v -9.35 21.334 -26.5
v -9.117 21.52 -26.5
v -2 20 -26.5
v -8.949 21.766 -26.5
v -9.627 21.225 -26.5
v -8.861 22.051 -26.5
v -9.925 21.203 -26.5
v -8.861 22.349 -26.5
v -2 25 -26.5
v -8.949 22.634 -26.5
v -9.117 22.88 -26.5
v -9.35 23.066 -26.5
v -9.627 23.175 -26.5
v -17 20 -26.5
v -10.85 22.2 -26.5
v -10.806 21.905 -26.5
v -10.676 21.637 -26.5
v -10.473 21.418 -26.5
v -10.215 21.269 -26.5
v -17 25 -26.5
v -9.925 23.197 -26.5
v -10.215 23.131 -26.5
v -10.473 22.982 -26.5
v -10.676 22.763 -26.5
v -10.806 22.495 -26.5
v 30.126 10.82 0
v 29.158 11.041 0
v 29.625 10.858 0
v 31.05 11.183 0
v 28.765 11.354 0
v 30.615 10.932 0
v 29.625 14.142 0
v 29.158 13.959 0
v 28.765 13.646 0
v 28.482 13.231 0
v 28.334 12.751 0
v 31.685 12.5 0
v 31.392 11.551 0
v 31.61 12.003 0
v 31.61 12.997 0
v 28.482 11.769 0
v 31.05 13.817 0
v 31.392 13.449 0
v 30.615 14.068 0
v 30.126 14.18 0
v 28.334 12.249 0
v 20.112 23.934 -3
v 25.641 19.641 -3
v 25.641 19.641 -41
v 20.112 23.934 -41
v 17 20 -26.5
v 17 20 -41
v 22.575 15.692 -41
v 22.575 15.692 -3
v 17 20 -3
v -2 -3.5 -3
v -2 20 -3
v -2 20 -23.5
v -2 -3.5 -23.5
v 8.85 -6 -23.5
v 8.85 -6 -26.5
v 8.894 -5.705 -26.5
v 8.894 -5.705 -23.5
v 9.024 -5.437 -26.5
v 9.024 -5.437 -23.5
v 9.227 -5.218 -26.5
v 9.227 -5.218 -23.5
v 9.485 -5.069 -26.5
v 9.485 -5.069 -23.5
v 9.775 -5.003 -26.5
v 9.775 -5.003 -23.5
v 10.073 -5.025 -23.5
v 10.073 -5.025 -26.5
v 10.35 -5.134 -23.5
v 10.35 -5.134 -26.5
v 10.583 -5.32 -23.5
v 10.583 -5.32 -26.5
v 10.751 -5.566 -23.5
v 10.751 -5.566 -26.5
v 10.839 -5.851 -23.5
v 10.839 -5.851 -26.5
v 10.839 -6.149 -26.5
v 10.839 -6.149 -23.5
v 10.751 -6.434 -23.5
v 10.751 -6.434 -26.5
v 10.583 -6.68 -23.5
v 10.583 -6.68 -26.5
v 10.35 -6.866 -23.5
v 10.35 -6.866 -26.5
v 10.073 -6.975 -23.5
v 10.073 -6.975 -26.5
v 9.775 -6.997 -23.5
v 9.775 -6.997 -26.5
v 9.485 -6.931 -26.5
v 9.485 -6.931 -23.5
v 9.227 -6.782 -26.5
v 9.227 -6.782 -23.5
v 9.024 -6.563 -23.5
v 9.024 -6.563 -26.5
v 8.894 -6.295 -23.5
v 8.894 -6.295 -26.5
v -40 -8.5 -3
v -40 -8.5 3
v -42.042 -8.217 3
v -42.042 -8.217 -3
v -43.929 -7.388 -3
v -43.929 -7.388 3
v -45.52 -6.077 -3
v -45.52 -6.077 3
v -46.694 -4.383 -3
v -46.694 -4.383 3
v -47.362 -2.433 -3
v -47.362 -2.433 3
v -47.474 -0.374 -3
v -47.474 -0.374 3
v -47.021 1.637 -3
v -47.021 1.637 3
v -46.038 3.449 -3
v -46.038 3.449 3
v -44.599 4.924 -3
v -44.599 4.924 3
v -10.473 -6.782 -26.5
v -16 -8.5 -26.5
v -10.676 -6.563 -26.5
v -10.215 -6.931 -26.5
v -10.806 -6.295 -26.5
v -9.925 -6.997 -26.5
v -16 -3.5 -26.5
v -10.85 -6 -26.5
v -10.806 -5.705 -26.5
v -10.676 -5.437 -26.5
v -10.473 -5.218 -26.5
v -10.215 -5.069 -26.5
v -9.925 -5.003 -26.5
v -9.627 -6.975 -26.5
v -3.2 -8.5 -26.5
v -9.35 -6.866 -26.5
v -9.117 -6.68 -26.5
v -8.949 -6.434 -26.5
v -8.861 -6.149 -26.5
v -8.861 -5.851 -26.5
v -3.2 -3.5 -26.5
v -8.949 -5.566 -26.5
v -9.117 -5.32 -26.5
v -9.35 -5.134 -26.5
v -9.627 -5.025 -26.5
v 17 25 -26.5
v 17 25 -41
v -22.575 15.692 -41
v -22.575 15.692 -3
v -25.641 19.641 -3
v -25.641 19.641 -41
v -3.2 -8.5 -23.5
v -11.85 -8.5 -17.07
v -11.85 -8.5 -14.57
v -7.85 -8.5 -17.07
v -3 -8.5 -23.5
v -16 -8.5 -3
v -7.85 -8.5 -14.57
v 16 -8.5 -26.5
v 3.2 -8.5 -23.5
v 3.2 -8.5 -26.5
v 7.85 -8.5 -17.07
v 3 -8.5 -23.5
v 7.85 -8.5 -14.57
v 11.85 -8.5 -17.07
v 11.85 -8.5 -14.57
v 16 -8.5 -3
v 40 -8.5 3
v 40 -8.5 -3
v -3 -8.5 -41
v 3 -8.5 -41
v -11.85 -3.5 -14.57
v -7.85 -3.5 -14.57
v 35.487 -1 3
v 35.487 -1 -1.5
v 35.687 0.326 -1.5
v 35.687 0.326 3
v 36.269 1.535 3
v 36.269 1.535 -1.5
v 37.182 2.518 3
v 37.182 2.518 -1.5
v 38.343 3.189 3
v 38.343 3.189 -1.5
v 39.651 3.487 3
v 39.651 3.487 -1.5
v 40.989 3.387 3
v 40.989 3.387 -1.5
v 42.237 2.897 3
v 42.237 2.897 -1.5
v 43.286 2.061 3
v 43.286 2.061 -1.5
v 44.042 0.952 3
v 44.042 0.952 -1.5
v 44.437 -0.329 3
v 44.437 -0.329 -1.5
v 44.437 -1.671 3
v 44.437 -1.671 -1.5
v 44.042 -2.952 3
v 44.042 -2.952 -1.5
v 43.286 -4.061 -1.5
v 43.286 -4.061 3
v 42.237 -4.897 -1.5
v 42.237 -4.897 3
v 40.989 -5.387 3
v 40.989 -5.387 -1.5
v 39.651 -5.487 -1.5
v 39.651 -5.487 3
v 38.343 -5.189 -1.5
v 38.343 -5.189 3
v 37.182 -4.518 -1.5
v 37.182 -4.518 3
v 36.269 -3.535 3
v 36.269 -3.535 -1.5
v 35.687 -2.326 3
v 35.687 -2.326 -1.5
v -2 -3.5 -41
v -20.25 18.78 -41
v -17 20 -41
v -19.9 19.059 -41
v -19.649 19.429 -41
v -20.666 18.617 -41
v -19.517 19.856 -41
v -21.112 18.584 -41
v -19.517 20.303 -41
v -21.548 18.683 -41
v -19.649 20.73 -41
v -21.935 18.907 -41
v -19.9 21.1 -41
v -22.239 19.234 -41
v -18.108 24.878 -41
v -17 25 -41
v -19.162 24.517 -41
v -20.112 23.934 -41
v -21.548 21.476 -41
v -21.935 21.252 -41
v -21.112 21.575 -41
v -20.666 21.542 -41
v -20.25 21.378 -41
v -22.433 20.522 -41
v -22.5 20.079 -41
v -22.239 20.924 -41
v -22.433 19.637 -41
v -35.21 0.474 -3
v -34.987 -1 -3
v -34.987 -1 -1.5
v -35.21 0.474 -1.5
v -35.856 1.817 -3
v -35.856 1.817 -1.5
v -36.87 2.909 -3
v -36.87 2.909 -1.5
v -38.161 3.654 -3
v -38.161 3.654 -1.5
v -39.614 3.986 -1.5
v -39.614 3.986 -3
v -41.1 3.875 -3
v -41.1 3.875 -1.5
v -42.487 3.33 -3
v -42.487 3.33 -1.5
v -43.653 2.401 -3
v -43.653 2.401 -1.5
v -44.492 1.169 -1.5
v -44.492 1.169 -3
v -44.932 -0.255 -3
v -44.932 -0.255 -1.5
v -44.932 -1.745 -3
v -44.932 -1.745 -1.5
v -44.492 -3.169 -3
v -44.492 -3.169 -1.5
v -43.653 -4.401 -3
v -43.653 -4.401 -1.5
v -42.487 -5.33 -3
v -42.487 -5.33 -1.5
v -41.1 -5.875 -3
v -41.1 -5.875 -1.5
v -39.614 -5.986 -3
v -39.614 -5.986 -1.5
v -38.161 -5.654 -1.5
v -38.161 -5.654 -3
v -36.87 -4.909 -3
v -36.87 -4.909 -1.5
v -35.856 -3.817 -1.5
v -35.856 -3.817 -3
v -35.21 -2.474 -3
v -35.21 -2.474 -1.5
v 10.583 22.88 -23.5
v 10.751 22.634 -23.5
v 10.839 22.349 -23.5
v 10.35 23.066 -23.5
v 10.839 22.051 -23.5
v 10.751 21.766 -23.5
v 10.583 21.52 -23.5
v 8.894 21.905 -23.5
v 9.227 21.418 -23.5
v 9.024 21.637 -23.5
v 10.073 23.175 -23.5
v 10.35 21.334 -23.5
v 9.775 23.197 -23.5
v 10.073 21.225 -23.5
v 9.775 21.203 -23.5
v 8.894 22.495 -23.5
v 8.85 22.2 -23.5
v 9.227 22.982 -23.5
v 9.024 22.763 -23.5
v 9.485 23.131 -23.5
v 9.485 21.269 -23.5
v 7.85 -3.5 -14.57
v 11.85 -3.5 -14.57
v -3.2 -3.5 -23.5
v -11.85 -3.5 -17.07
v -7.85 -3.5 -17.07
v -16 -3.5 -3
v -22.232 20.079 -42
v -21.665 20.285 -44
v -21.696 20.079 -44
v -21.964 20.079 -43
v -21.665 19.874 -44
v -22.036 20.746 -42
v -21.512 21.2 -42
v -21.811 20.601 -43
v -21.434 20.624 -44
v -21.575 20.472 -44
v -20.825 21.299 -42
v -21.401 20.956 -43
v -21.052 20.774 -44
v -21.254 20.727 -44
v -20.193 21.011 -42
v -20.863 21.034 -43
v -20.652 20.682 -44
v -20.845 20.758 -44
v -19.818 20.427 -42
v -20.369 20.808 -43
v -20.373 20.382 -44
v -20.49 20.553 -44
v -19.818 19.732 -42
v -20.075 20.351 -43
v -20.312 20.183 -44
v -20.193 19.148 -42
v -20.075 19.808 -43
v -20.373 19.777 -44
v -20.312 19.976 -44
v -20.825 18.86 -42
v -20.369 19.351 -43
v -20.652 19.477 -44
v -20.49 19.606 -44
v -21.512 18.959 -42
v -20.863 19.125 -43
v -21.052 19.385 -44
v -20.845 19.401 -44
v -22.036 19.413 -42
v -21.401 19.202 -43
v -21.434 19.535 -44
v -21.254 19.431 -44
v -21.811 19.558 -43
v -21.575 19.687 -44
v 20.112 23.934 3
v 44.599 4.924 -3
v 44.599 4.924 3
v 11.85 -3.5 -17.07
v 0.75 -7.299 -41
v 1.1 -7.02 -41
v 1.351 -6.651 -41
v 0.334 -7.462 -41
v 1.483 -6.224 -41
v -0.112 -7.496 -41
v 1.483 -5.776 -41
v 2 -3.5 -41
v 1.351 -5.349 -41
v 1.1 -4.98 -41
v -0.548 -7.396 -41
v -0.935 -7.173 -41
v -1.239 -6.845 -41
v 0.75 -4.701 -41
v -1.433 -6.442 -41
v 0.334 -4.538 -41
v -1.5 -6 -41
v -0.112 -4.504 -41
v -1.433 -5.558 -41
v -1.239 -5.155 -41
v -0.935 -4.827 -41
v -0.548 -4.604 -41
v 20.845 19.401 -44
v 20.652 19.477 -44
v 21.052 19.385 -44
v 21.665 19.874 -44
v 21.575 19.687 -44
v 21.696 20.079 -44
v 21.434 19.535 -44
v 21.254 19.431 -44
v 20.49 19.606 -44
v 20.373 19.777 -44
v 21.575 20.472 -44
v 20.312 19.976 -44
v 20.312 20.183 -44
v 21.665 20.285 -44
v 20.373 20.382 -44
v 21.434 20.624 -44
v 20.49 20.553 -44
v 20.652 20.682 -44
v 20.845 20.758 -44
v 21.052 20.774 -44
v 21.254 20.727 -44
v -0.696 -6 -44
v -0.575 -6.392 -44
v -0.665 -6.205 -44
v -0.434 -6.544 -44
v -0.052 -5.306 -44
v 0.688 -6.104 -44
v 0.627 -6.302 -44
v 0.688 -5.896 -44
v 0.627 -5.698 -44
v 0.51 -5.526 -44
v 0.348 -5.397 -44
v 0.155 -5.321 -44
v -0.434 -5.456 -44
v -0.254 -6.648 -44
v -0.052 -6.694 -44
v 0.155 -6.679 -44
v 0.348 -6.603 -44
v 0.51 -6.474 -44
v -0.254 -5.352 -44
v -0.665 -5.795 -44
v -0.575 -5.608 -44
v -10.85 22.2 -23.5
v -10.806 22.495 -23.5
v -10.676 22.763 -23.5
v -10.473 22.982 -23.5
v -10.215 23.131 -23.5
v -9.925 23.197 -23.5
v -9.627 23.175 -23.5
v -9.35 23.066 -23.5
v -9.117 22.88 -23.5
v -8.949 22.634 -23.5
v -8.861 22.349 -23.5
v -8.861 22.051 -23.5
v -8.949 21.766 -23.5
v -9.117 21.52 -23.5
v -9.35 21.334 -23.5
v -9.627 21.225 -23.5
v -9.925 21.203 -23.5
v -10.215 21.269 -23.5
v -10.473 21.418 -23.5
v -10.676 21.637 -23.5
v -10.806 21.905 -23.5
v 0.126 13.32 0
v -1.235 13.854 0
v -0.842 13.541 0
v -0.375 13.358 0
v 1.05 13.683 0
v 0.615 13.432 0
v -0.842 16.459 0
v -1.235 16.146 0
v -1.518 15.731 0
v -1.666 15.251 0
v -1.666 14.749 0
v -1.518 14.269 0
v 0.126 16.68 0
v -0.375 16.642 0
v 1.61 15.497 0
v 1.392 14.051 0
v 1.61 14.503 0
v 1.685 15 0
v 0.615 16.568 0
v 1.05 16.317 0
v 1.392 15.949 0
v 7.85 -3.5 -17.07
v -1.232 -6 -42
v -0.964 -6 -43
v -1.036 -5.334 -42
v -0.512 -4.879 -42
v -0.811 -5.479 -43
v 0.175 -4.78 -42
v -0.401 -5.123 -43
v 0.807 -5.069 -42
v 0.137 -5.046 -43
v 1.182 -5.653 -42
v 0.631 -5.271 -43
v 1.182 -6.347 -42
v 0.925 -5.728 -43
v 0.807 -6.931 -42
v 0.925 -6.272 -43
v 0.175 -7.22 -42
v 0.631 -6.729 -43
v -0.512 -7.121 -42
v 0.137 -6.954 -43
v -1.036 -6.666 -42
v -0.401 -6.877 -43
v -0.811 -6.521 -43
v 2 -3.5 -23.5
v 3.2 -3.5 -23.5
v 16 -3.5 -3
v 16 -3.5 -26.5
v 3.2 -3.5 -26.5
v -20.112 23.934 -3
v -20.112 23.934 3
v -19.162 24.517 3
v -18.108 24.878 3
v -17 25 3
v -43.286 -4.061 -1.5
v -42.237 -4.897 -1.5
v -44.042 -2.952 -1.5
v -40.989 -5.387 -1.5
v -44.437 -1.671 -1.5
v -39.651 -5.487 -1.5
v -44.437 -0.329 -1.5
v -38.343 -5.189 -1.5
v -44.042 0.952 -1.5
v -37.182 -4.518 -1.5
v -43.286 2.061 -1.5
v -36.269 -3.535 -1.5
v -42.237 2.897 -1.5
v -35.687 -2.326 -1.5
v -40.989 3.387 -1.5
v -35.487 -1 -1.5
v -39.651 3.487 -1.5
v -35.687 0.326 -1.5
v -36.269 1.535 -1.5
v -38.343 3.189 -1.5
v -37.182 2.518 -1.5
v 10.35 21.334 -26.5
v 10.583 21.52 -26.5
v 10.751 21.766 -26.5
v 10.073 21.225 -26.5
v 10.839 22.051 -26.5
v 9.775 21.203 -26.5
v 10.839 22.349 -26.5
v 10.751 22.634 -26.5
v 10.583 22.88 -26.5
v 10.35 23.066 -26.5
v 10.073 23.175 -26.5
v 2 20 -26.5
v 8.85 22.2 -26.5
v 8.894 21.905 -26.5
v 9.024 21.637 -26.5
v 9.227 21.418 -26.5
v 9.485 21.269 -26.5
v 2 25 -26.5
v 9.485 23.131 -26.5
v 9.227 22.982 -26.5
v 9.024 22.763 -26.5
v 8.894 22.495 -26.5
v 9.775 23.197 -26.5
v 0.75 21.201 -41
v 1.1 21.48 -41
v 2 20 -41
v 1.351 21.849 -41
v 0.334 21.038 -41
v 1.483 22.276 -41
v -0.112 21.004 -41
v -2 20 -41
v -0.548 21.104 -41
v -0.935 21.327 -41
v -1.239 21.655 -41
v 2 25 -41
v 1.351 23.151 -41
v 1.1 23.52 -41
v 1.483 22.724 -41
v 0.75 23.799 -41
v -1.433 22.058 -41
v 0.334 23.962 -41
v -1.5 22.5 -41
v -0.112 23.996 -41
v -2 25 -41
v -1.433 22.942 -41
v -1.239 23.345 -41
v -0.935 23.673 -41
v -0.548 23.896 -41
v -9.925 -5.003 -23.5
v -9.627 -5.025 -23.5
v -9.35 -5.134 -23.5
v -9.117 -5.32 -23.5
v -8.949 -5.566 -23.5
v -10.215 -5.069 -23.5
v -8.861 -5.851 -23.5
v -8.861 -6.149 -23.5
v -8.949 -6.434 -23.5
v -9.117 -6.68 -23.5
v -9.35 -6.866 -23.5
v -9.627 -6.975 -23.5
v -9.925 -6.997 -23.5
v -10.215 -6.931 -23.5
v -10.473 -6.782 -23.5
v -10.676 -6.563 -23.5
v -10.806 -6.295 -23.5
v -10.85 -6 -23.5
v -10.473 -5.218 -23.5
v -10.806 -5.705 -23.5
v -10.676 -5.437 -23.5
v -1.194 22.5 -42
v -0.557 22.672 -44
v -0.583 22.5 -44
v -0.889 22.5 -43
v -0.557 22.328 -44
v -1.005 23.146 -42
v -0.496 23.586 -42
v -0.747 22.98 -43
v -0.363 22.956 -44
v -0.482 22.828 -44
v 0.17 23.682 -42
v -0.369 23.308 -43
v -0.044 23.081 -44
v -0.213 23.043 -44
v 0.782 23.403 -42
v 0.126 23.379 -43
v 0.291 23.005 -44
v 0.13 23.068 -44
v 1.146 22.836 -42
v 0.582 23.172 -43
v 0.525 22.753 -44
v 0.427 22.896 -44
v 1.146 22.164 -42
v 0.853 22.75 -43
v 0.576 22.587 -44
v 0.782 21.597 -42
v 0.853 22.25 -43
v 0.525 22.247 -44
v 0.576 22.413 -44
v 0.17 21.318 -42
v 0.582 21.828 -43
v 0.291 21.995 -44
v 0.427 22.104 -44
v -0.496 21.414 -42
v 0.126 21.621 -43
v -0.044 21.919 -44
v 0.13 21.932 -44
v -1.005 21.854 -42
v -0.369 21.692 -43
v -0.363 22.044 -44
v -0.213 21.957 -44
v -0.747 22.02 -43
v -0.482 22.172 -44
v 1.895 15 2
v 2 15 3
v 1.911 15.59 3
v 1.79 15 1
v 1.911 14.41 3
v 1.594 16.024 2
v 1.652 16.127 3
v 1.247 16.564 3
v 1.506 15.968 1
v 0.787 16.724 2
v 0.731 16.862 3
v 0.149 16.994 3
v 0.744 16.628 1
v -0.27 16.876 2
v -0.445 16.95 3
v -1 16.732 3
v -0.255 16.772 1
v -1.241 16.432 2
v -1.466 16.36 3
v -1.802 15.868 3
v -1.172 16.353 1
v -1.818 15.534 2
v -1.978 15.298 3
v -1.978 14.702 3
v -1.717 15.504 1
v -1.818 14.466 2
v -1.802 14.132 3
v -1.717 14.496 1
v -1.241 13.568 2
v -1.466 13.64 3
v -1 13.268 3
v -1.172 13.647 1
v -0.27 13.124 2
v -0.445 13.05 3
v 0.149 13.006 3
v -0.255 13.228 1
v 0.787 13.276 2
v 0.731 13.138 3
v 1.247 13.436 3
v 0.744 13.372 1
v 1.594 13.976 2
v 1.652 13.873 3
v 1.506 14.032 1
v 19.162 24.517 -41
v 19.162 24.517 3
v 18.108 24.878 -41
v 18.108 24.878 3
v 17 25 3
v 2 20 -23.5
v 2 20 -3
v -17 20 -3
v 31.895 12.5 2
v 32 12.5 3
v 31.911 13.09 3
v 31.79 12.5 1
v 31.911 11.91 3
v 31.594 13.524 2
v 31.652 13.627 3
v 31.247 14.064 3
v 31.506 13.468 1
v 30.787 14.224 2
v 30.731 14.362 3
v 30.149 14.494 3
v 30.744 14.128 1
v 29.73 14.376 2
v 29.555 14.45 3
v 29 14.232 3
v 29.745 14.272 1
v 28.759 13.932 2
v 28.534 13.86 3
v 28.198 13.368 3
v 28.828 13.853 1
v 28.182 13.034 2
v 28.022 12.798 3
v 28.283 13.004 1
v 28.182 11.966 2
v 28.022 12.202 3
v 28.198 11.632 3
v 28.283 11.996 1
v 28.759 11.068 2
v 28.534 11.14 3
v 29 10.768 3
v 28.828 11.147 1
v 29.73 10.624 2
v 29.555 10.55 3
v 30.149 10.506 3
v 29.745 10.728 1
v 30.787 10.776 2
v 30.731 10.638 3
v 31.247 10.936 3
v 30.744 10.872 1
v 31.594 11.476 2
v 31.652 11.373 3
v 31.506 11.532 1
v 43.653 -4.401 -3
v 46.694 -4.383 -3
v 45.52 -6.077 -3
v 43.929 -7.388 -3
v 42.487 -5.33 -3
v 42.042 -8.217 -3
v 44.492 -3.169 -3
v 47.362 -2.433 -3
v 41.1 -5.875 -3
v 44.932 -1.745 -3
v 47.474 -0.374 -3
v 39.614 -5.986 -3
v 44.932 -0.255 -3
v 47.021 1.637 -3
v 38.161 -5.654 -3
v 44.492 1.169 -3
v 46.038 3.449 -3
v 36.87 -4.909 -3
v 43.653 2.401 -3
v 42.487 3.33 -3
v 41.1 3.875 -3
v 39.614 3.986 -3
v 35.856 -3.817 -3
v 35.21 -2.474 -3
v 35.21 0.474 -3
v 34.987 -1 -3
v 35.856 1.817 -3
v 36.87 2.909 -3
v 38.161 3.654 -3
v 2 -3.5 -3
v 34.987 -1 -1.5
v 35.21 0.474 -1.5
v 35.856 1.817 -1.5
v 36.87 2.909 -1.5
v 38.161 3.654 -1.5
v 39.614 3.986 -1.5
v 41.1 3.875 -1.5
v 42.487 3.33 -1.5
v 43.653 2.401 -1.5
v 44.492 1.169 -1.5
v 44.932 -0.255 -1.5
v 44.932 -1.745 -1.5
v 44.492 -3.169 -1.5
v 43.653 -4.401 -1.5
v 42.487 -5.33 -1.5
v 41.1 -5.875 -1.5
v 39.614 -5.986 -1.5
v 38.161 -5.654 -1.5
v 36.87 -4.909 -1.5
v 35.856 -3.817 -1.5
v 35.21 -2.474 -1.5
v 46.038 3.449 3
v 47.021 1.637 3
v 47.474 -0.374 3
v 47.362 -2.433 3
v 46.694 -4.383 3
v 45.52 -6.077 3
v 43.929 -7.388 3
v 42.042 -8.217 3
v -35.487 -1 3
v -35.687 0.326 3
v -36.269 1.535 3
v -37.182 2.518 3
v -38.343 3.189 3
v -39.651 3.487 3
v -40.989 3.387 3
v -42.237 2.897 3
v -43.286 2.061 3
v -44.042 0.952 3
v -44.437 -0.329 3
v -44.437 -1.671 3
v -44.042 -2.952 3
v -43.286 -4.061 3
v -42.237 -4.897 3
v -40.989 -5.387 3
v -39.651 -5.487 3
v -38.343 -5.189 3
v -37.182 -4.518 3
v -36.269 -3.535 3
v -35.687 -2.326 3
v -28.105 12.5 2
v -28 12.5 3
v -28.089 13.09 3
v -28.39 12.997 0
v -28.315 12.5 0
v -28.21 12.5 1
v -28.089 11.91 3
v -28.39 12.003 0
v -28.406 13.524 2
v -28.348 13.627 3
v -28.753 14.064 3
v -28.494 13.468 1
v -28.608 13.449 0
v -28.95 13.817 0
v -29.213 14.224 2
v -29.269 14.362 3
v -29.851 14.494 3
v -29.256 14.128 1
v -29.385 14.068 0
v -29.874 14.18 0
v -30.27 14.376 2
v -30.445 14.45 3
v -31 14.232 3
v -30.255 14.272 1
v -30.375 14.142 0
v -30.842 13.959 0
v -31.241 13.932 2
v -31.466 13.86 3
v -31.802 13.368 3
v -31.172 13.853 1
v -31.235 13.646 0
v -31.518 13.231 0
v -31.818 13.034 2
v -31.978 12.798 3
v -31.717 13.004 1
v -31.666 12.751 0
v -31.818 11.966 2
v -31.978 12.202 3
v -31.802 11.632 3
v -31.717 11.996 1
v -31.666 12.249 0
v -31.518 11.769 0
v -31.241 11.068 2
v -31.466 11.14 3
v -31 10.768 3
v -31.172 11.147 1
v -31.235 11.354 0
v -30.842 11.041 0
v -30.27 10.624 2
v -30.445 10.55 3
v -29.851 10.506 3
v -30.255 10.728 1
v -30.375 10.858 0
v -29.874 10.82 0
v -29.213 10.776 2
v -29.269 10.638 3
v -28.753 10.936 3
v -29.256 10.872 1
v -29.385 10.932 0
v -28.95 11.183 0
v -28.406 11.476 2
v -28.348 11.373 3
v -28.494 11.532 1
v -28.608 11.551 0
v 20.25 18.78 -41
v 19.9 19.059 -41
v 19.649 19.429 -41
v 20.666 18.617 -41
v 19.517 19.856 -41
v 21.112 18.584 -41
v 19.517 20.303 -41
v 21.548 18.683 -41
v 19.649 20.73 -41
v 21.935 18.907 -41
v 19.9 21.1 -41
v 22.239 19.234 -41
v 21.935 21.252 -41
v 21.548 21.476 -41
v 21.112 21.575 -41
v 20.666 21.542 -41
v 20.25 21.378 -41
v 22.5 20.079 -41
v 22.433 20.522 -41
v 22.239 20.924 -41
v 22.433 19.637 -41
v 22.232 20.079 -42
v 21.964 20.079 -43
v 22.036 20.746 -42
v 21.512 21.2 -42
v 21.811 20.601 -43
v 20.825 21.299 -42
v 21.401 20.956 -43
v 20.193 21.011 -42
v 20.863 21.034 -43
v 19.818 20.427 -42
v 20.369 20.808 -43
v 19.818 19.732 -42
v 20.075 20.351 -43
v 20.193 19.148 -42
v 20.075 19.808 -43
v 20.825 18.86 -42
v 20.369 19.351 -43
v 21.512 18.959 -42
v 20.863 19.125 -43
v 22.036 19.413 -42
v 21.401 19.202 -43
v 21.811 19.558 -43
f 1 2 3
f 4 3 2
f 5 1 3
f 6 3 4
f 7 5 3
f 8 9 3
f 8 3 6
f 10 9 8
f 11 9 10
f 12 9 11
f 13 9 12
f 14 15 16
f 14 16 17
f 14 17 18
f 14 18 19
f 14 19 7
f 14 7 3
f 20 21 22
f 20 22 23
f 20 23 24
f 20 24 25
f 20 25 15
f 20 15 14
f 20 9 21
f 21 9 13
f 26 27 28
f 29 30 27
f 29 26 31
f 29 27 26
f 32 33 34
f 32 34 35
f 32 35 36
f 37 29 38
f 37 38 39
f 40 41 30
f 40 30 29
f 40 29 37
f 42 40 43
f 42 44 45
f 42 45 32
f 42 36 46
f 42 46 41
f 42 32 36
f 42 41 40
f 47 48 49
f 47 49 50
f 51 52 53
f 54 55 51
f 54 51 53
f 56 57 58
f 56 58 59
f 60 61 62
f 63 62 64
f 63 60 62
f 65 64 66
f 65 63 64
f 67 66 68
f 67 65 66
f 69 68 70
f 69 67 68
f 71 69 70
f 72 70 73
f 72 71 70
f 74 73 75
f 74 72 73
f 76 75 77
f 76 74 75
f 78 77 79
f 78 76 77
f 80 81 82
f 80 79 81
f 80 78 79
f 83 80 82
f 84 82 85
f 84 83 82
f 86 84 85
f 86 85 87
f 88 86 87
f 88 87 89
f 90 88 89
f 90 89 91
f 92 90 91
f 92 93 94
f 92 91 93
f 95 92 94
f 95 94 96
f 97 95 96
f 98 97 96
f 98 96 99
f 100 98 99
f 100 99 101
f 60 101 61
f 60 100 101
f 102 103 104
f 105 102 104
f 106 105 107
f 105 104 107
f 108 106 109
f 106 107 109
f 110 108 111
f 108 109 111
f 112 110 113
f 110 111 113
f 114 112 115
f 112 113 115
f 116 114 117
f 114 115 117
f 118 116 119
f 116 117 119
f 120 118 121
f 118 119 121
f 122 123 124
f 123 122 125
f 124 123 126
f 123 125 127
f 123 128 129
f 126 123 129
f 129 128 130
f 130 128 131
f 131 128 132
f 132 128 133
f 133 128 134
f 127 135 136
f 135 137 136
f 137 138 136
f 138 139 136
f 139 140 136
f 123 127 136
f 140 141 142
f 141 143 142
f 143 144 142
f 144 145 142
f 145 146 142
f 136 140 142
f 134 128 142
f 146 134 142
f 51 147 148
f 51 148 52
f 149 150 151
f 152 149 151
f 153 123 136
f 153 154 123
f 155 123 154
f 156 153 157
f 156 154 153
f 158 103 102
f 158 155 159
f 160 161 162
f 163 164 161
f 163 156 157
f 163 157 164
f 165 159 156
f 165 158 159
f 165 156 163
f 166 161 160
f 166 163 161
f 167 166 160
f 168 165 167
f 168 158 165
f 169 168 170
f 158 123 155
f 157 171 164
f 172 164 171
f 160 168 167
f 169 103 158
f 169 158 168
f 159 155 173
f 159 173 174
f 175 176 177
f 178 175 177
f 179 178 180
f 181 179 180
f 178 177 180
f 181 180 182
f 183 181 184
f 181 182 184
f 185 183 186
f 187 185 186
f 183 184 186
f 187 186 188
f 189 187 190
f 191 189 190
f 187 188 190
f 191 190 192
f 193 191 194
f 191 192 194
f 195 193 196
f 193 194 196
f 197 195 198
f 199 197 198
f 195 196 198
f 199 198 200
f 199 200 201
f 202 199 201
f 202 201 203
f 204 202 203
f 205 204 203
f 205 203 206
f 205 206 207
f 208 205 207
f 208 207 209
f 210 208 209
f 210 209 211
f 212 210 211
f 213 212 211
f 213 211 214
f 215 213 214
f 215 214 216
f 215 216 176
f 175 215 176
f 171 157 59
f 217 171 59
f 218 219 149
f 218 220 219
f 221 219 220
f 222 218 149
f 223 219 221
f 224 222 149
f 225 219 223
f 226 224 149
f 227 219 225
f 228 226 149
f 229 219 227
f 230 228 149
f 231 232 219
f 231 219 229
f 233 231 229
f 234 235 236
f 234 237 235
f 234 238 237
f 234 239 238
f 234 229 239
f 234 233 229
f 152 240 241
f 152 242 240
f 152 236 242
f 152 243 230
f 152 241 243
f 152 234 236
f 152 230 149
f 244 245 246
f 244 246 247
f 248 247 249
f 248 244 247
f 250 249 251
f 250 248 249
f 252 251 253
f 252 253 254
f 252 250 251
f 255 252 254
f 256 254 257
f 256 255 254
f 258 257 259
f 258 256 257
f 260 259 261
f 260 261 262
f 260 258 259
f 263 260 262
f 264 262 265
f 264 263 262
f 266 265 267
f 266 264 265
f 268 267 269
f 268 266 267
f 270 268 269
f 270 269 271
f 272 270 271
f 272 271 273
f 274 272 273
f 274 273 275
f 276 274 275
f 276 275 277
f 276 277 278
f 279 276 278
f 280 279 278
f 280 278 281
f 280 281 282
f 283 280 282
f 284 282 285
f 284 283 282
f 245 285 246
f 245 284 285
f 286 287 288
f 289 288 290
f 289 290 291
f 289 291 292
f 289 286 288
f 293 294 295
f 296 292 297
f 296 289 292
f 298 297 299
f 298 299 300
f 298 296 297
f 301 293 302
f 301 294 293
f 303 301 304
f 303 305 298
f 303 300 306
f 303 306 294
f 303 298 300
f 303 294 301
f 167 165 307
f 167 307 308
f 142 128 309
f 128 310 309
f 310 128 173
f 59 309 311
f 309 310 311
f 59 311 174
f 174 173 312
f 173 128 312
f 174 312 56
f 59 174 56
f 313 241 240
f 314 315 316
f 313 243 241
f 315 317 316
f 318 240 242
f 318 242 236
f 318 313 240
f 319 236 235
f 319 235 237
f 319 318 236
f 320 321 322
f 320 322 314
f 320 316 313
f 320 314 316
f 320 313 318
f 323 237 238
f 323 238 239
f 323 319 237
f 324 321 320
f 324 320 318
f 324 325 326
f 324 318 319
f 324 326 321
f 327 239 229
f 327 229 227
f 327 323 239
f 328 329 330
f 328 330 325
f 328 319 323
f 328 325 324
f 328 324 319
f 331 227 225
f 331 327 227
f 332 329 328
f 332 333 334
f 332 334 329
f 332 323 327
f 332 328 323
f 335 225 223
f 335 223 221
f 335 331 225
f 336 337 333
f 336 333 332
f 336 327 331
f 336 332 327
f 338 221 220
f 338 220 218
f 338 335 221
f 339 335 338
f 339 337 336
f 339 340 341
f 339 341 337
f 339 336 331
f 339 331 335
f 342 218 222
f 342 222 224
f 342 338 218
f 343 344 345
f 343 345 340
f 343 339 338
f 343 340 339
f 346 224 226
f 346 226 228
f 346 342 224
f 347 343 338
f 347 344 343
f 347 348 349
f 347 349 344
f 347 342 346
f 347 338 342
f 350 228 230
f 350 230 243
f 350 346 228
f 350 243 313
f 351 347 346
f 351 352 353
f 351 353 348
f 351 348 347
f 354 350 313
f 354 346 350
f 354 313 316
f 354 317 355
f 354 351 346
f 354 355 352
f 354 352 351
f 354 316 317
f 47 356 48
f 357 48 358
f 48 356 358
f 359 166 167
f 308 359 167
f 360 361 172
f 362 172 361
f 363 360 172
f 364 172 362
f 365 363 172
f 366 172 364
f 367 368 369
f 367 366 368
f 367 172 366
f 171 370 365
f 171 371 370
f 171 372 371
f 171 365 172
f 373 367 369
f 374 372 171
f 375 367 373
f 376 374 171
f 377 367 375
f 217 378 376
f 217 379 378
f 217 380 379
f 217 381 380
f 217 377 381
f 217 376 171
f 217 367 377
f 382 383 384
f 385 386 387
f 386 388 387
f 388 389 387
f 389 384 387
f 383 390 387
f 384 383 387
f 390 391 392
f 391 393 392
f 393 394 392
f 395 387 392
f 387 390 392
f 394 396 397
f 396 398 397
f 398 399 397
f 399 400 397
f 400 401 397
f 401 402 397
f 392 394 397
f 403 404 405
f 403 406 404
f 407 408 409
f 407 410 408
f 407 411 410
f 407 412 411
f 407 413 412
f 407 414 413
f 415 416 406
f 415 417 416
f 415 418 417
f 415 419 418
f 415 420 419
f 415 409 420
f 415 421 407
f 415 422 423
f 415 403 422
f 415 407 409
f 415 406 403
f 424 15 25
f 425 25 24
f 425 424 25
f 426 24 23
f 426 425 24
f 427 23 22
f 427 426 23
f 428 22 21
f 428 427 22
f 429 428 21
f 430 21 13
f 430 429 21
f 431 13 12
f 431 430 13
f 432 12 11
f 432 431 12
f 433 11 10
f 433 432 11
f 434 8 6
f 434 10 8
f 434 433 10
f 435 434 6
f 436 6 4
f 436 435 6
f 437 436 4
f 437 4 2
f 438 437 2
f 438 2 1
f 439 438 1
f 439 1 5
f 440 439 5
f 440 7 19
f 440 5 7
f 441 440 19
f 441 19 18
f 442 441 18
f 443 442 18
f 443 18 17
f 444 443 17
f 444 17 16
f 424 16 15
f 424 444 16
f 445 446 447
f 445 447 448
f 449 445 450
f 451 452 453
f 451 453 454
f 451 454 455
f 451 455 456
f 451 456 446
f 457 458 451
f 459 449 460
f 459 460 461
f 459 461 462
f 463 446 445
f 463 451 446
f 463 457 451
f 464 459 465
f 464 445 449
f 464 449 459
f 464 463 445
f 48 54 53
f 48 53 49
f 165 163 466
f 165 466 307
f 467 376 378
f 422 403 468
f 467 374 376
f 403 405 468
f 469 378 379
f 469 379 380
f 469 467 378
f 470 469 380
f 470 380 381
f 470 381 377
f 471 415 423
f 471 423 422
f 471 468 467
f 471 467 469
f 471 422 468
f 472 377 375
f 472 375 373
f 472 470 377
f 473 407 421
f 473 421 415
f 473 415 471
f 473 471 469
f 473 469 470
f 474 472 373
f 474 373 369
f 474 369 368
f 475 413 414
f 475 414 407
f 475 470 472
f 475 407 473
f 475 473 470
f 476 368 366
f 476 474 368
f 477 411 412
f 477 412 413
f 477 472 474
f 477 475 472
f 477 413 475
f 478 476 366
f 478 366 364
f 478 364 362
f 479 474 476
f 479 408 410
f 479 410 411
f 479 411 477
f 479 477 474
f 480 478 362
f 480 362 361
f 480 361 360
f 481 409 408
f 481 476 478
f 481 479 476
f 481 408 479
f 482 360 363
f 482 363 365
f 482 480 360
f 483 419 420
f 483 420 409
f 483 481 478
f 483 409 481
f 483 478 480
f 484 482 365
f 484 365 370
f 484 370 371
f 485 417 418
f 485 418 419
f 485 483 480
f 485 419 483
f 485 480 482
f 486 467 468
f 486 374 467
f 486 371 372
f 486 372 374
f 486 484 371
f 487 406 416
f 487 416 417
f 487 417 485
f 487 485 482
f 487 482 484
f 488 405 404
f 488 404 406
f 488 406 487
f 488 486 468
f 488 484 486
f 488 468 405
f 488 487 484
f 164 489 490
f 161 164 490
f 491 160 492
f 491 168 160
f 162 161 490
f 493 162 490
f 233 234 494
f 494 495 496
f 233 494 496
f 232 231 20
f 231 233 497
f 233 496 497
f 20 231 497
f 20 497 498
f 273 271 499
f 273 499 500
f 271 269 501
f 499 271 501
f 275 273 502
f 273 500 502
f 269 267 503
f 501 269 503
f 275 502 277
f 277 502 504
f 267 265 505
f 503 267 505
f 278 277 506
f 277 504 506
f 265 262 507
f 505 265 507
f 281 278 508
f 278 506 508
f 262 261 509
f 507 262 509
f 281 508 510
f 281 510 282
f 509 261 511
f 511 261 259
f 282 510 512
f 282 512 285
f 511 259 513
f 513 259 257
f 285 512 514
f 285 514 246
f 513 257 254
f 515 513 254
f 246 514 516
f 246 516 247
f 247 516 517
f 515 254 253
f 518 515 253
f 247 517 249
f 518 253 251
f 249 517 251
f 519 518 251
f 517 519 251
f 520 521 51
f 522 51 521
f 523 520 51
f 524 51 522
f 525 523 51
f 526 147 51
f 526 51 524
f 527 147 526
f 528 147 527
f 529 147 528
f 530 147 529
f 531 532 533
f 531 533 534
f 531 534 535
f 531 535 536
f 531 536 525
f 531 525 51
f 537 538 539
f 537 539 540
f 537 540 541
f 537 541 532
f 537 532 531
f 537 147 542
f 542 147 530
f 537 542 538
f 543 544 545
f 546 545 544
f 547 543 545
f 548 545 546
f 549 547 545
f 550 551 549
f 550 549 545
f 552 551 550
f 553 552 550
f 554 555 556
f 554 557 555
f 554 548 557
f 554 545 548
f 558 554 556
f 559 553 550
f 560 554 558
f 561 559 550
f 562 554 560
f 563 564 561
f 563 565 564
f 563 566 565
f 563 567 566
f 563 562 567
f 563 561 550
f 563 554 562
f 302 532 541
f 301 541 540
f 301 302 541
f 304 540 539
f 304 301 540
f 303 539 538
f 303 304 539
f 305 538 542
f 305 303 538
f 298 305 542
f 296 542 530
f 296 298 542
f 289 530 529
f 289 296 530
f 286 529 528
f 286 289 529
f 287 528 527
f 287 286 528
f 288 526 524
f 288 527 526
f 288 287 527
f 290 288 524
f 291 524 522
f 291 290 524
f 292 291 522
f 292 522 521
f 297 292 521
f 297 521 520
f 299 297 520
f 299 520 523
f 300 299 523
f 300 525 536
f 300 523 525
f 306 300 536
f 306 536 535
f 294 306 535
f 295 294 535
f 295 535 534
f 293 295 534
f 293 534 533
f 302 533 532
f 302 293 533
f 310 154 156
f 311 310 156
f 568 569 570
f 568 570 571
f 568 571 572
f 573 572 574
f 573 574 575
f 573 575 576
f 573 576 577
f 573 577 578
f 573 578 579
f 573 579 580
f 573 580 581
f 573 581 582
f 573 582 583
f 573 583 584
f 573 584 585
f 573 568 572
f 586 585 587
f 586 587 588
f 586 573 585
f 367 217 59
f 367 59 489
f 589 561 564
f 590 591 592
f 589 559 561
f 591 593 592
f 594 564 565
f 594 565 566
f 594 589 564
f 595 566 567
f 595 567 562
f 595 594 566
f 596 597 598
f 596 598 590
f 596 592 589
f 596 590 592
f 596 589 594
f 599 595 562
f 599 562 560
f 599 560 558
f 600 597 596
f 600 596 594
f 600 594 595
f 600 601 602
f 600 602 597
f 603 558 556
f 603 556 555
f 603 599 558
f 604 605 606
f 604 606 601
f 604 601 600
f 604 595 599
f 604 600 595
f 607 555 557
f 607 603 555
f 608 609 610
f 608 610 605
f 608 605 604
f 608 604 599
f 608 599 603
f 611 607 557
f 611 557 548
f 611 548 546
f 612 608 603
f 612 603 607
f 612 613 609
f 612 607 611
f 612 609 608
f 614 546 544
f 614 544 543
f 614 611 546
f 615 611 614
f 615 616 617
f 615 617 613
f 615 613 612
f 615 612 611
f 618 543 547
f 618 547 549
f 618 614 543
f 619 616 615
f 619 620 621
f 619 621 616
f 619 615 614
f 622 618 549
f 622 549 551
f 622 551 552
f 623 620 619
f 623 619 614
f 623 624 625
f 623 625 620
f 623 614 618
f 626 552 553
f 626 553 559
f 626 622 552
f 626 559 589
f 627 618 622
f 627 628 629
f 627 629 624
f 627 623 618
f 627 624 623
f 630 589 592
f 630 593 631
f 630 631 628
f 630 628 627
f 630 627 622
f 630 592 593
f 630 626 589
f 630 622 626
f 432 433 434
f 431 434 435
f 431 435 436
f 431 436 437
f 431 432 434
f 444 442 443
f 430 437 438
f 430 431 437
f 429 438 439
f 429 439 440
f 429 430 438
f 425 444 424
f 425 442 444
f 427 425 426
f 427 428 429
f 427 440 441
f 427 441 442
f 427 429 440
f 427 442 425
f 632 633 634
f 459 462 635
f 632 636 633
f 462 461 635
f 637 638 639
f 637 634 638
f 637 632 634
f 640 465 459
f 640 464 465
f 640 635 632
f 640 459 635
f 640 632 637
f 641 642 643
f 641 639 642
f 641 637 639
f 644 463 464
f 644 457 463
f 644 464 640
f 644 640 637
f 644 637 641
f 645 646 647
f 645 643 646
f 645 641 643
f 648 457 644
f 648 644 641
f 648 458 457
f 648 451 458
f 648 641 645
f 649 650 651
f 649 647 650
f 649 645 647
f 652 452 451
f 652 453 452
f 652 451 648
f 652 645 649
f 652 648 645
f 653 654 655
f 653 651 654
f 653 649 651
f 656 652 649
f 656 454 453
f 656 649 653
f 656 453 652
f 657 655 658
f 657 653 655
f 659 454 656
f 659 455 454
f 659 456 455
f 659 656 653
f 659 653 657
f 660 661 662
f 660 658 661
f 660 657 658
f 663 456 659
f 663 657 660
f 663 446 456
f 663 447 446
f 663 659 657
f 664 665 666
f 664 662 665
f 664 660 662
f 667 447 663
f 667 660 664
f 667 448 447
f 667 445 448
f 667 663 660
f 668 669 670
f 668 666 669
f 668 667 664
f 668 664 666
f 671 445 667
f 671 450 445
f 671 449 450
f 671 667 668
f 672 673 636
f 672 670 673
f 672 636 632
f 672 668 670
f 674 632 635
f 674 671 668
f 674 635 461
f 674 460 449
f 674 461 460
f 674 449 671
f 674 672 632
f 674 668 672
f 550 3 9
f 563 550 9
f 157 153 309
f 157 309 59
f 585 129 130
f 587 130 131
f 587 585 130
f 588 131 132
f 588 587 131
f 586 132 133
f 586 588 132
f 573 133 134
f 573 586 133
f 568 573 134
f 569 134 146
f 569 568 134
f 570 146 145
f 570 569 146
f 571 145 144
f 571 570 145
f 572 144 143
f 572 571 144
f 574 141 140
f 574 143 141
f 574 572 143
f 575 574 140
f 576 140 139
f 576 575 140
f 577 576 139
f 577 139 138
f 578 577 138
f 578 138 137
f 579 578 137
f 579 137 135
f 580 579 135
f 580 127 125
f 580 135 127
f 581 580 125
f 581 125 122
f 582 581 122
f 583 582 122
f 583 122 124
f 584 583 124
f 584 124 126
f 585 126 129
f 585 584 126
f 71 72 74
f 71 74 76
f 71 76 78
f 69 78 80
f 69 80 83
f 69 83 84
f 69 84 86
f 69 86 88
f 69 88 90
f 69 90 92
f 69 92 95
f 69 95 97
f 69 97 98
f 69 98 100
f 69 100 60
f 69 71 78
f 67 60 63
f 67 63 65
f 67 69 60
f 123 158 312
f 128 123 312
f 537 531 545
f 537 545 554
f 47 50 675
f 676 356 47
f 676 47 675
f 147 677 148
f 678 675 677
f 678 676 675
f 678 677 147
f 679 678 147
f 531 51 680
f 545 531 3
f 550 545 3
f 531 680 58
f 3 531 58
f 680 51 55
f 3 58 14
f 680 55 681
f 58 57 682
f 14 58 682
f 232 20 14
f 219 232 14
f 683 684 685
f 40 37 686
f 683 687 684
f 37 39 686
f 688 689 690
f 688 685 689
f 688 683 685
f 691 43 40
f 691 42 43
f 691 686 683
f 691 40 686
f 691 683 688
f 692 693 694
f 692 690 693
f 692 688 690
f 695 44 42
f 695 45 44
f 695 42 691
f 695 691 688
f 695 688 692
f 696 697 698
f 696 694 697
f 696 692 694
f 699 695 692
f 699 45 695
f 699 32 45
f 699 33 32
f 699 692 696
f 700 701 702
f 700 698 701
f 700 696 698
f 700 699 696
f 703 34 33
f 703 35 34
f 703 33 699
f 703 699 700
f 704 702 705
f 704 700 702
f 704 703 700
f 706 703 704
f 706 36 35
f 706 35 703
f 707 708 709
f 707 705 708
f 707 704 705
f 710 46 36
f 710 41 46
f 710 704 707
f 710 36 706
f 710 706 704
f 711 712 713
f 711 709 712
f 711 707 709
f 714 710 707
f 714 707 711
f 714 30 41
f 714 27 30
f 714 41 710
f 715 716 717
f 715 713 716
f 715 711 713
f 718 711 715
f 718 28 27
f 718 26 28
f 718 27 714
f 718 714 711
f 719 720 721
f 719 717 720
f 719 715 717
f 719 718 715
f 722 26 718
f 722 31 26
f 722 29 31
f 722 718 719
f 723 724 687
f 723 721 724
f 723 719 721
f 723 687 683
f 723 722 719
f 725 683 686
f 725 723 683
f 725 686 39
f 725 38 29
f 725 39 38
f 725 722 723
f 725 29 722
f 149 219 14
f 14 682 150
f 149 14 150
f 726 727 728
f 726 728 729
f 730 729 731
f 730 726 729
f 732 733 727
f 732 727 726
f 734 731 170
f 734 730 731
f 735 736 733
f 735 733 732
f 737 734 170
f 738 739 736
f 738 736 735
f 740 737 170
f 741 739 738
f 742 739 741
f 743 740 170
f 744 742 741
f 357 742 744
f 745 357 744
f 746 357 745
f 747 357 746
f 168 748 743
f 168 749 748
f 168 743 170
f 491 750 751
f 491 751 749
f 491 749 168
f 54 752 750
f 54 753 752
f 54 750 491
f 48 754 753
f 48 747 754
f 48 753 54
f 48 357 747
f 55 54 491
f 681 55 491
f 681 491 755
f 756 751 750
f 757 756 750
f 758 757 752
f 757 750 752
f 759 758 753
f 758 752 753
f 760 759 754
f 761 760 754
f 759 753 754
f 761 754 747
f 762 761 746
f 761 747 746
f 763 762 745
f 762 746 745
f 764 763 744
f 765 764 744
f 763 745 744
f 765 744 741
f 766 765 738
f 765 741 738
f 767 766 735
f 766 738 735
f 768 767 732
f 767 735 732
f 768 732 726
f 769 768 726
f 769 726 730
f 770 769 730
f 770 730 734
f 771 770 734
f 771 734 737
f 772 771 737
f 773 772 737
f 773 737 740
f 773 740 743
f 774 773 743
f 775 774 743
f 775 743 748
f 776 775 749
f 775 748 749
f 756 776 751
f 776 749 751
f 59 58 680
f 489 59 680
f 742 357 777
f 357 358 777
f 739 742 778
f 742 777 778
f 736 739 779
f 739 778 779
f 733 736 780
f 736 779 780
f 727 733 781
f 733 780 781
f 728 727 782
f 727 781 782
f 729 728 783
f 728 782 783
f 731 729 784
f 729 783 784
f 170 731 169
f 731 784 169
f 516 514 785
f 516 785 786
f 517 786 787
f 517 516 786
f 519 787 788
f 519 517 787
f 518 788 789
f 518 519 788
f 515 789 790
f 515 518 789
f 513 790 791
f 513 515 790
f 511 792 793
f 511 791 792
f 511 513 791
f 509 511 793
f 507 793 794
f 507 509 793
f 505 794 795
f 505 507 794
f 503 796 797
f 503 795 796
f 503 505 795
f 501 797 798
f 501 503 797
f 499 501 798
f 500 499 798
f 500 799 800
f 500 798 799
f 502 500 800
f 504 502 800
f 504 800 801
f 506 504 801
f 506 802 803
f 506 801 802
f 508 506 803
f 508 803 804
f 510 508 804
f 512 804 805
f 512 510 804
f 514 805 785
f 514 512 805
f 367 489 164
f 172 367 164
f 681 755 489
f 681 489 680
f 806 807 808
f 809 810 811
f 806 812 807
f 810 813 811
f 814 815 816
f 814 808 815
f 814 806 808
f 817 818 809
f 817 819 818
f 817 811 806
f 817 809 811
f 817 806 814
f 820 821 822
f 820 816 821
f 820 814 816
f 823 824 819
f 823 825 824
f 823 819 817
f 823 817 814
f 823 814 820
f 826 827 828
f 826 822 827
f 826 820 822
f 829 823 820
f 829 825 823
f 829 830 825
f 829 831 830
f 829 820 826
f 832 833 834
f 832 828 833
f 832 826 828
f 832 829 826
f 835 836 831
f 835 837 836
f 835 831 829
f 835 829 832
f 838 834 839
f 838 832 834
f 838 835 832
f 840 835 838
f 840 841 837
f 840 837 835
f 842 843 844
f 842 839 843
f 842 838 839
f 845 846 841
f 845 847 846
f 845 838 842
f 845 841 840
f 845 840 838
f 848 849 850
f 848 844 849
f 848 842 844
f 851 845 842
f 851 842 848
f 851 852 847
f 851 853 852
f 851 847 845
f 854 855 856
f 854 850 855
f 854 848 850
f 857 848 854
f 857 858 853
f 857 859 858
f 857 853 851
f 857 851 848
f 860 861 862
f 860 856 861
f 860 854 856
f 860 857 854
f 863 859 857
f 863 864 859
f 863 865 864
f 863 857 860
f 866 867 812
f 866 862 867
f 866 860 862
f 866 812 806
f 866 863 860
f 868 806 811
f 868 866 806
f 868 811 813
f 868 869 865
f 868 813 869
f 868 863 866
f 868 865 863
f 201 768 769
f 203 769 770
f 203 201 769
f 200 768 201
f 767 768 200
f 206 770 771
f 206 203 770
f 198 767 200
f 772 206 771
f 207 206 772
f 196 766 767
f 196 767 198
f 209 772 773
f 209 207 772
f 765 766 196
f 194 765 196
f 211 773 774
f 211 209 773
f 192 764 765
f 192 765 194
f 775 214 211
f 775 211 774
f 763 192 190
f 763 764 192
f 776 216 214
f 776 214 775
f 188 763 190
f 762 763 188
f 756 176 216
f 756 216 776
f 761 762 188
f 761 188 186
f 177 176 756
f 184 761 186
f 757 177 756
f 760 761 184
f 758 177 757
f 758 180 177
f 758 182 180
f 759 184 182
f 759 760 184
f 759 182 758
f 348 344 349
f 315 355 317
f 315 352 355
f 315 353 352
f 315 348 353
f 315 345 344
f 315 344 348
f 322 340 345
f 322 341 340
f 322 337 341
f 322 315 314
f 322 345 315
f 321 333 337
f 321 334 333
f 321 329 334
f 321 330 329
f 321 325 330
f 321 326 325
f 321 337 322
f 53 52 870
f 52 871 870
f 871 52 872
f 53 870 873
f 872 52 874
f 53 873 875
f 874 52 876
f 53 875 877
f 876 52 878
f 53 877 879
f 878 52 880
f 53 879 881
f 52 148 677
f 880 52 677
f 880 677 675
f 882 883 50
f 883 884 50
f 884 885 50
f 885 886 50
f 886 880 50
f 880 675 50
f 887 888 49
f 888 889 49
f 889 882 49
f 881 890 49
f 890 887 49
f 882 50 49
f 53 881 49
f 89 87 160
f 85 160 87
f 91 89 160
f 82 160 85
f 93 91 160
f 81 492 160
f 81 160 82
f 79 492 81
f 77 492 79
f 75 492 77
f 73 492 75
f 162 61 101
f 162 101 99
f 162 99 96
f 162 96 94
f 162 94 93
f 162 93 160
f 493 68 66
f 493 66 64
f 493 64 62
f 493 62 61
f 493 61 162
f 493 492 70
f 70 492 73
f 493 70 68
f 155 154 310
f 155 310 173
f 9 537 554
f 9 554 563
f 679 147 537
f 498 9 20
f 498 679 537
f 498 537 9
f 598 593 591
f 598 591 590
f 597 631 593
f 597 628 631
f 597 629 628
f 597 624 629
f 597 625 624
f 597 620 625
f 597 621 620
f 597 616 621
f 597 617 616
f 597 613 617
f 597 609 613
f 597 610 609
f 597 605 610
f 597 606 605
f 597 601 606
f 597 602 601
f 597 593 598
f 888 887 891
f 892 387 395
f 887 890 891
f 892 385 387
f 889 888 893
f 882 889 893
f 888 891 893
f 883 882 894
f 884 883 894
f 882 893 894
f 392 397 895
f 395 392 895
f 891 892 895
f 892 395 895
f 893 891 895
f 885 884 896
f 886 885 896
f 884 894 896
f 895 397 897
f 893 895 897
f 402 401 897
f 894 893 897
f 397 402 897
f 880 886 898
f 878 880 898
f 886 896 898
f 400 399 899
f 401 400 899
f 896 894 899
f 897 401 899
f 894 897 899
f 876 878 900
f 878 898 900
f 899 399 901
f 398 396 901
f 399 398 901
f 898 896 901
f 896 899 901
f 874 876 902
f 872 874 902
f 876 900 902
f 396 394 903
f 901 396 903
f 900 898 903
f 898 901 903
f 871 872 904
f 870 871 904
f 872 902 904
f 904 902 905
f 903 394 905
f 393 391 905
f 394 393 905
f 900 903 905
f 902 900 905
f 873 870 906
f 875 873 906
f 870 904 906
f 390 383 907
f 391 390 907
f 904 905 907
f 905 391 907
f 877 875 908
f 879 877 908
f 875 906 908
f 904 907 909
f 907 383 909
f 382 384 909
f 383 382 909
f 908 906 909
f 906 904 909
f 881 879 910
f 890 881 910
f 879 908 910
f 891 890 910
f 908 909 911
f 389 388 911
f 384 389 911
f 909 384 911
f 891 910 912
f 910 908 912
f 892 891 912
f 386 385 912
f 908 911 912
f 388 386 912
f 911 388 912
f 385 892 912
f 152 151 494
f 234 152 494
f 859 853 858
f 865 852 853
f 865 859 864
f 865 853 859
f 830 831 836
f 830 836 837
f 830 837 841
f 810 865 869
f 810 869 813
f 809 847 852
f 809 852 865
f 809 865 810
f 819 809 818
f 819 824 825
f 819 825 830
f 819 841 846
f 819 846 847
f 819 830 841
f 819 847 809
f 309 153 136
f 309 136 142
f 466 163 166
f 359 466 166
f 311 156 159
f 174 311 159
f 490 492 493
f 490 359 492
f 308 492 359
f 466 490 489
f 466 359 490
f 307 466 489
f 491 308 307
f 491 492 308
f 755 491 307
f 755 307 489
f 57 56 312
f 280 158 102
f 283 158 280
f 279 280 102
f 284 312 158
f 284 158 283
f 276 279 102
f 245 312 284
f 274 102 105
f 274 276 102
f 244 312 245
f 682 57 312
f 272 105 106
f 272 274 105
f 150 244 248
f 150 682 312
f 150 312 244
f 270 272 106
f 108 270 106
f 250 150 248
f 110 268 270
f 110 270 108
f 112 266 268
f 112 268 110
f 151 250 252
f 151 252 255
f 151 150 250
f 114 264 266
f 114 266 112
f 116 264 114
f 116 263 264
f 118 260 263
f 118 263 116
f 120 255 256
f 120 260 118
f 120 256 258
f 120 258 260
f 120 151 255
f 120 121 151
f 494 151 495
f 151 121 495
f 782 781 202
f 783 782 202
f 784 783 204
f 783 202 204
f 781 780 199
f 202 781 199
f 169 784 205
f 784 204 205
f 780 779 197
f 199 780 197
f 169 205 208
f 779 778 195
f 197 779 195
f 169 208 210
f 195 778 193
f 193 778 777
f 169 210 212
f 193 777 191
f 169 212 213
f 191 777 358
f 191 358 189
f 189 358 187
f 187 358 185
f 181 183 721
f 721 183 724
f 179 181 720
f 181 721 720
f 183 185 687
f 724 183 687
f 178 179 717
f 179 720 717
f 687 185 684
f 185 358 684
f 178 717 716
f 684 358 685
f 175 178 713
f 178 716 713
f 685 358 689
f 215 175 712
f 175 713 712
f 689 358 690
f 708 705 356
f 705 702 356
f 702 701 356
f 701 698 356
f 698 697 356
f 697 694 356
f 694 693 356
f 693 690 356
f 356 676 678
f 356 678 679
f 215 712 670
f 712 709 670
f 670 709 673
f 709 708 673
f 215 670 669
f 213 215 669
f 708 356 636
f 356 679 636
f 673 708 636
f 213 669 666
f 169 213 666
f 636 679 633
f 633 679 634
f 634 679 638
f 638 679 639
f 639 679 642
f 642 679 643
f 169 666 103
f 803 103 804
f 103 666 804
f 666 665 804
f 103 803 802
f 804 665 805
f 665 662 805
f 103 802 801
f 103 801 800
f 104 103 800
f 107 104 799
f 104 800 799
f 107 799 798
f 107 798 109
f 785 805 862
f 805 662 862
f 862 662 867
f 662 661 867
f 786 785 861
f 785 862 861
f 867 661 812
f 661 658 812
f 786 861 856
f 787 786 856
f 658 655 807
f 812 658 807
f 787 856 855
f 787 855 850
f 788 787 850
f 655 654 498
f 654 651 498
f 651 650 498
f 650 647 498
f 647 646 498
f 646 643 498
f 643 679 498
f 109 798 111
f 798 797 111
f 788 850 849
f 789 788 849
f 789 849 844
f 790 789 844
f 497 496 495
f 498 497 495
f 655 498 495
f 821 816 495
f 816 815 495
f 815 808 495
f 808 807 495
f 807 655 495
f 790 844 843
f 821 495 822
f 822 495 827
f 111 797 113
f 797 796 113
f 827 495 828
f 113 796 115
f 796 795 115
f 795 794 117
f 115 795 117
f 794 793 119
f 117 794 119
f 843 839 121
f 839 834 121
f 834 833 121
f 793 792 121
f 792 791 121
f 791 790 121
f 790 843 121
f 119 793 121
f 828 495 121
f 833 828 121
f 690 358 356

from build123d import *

# Parameters (mm, degrees)
BOSS_EXTRUDE2_DEPTH  = 3
SKETCH3_R            = 4.5
CUT_EXTRUDE3_DEPTH   = 8
SKETCH4_R            = 5
CUT_EXTRUDE4_DEPTH   = 1.5
BOSS_EXTRUDE3_DEPTH  = 20.5
BOSS_EXTRUDE4_DEPTH  = 38
BOSS_EXTRUDE5_DEPTH  = 17.5
SKETCH10_R           = 1.5
BOSS_EXTRUDE6_DEPTH  = 3
BOSS_EXTRUDE6_TAPER  = 15
SKETCH11_R           = 2
CUT_EXTRUDE6_DEPTH   = 3
CUT_EXTRUDE6_TAPER   = 6
SKETCH12_W           = 12.8
SKETCH12_H           = 5
BOSS_EXTRUDE11_DEPTH = 3
SKETCH13_W           = 34
SKETCH13_H           = 5
BOSS_EXTRUDE12_DEPTH = 3
SKETCH9_R            = 1
CUT_EXTRUDE5_DEPTH   = 5
SKETCH15_W           = 4
SKETCH15_H           = 2.5
CUT_EXTRUDE7_DEPTH   = 10
SKETCH16_W           = 4
SKETCH16_H           = 5
BOSS_EXTRUDE13_DEPTH = 14.5
SKETCH17_R           = 1.5
BOSS_EXTRUDE14_DEPTH = 3
BOSS_EXTRUDE14_TAPER = 17


with BuildPart() as part:
    # Sketch1 → Boss-Extrude2 (new body, symmetric)
    with BuildSketch(Plane.XY):
        with BuildLine():
            Line((-44.599094606, 4.924384255), (-20.111639684, 23.933975293))
            ThreePointArc((-20.111639684, 23.933975293), (-18.64459039, 24.726101678), (-17, 25))
            Line((-17, 25), (17, 25))
            ThreePointArc((17, 25), (18.64459039, 24.726101678), (20.111639684, 23.933975293))
            Line((20.111639684, 23.933975293), (44.599094606, 4.924384255))
            ThreePointArc((44.599094606, 4.924384255), (47.095170256, -3.430752773), (40, -8.5))
            Line((40, -8.5), (-40, -8.5))
            ThreePointArc((-40, -8.5), (-47.095170256, -3.430752773), (-44.599094606, 4.924384255))
        make_face()
    extrude(amount=BOSS_EXTRUDE2_DEPTH, both=True)

    # Sketch3 → Cut-Extrude3 (cut)
    with BuildSketch(Plane(origin=(0, 0, -3), x_dir=(-1, 0, 0), z_dir=(0, 0, -1))):
        with Locations((-39.987497786, -1.00001042)):
            Circle(SKETCH3_R)
    cut_extrude3 = extrude(amount=-CUT_EXTRUDE3_DEPTH, mode=Mode.SUBTRACT)

    # Sketch4 → Cut-Extrude4 (cut)
    with BuildSketch(Plane(origin=(0, 0, -3), x_dir=(-1, 0, 0), z_dir=(0, 0, -1))):
        with Locations((-39.987497786, -1.00001042)):
            Circle(SKETCH4_R)
    cut_extrude4 = extrude(amount=-CUT_EXTRUDE4_DEPTH, mode=Mode.SUBTRACT)

    # Mirror1: Cut-Extrude3, Cut-Extrude4 across plane
    add(cut_extrude3.mirror(Plane(origin=(0, 0, 0), x_dir=(0, 0, 1), z_dir=(1, 0, 0))), mode=Mode.SUBTRACT)
    add(cut_extrude4.mirror(Plane(origin=(0, 0, 0), x_dir=(0, 0, 1), z_dir=(1, 0, 0))), mode=Mode.SUBTRACT)

    # Sketch5 → Boss-Extrude3 (add)
    with BuildSketch(Plane(origin=(0, 0, -3), x_dir=(-1, 0, 0), z_dir=(0, 0, -1))):
        Polygon((-17, 25), (17, 25), (17, 20), (2, 20), (2, -3.5), (16, -3.5), (16, -8.5), (-16, -8.5), (-16, -3.5), (-2, -3.5), (-2, 20), (-17, 20), align=None)
    extrude(amount=BOSS_EXTRUDE3_DEPTH)

    # Sketch7 → Boss-Extrude4 (add)
    with BuildSketch(Plane(origin=(0, 0, -3), x_dir=(-1, 0, 0), z_dir=(0, 0, -1))):
        with BuildLine():
            Line((17, 20), (22.575001918, 15.691897491))
            Line((22.575001918, 15.691897491), (25.641064989, 19.641486995))
            Line((25.641064989, 19.641486995), (20.111639684, 23.933975293))
            ThreePointArc((20.111639684, 23.933975293), (18.64459039, 24.726101678), (17, 25))
            Line((17, 25), (17, 20))
        make_face()
    boss_extrude4 = extrude(amount=BOSS_EXTRUDE4_DEPTH)

    # Mirror2: Boss-Extrude4 across plane
    add(boss_extrude4.mirror(Plane(origin=(0, 0, 0), x_dir=(0, 0, 1), z_dir=(1, 0, 0))))

    # Sketch8 → Boss-Extrude5 (add)
    with BuildSketch(Plane(origin=(0, 0, -23.5), x_dir=(-1, 0, 0), z_dir=(0, 0, -1))):
        Polygon((0, -8.5), (3, -8.5), (2, -3.5), (-2, -3.5), (-3, -8.5), align=None)
    extrude(amount=BOSS_EXTRUDE5_DEPTH)

    # Sketch10 → Boss-Extrude6 (add)
    with BuildSketch(Plane(origin=(0, 0, -41), x_dir=(-1, 0, 0), z_dir=(0, 0, -1))):
        with Locations((21, 20.079456047)):
            Circle(SKETCH10_R)
        with Locations((0, -6)):
            Circle(SKETCH10_R)
    boss_extrude6 = extrude(amount=BOSS_EXTRUDE6_DEPTH, taper=BOSS_EXTRUDE6_TAPER)

    # Mirror3: Boss-Extrude6 across plane
    add(boss_extrude6.mirror(Plane(origin=(0, 0, 0), x_dir=(0, 0, 1), z_dir=(1, 0, 0))))

    # Sketch11 → Cut-Extrude6 (cut)
    with BuildSketch(Plane.XY.offset(3)):
        with Locations((0, 15)):
            Circle(SKETCH11_R)
        with Locations((30, 12.5)):
            Circle(SKETCH11_R)
        with Locations((-30, 12.5)):
            Circle(SKETCH11_R)
    extrude(amount=-CUT_EXTRUDE6_DEPTH, taper=CUT_EXTRUDE6_TAPER, mode=Mode.SUBTRACT)

    # Sketch12 → Boss-Extrude11 (add)
    with BuildSketch(Plane(origin=(0, 0, -23.5), x_dir=(-1, 0, 0), z_dir=(0, 0, -1))):
        with Locations((-9.6, -6)):
            Rectangle(SKETCH12_W, SKETCH12_H)
    boss_extrude11 = extrude(amount=BOSS_EXTRUDE11_DEPTH)

    # Mirror4: Boss-Extrude11 across plane
    add(boss_extrude11.mirror(Plane(origin=(0, 0, 0), x_dir=(0, 0, 1), z_dir=(1, 0, 0))))

    # Sketch13 → Boss-Extrude12 (add)
    with BuildSketch(Plane(origin=(0, 0, -23.5), x_dir=(-1, 0, 0), z_dir=(0, 0, -1))):
        with Locations((0, 22.5)):
            Rectangle(SKETCH13_W, SKETCH13_H)
    extrude(amount=BOSS_EXTRUDE12_DEPTH)

    # Sketch9 → Cut-Extrude5 (cut)
    with BuildSketch(Plane(origin=(0, 0, -23.5), x_dir=(-1, 0, 0), z_dir=(0, 0, -1))):
        with Locations((-9.85, -6)):
            Circle(SKETCH9_R)
        with Locations((-9.85, 22.2)):
            Circle(SKETCH9_R)
        with Locations((9.85, 22.2)):
            Circle(SKETCH9_R)
        with Locations((9.85, -6)):
            Circle(SKETCH9_R)
    extrude(amount=CUT_EXTRUDE5_DEPTH, mode=Mode.SUBTRACT)

    # Sketch15 → Cut-Extrude7 (cut)
    with BuildSketch(Plane.XZ.offset(8.5)):
        with Locations((-9.85, -15.82)):
            Rectangle(SKETCH15_W, SKETCH15_H)
        with Locations((9.85, -15.82)):
            Rectangle(SKETCH15_W, SKETCH15_H)
    extrude(amount=-CUT_EXTRUDE7_DEPTH, mode=Mode.SUBTRACT)

    # Sketch16 → Boss-Extrude13 (add)
    with BuildSketch(Plane(origin=(0, 0, -26.5), x_dir=(-1, 0, 0), z_dir=(0, 0, -1))):
        with Locations((0, 22.5)):
            Rectangle(SKETCH16_W, SKETCH16_H)
    extrude(amount=BOSS_EXTRUDE13_DEPTH)

    # Sketch17 → Boss-Extrude14 (add)
    with BuildSketch(Plane(origin=(0, 0, -41), x_dir=(-1, 0, 0), z_dir=(0, 0, -1))):
        with Locations((0, 22.5)):
            Circle(SKETCH17_R)
    extrude(amount=BOSS_EXTRUDE14_DEPTH, taper=BOSS_EXTRUDE14_TAPER)


solid = part.part
